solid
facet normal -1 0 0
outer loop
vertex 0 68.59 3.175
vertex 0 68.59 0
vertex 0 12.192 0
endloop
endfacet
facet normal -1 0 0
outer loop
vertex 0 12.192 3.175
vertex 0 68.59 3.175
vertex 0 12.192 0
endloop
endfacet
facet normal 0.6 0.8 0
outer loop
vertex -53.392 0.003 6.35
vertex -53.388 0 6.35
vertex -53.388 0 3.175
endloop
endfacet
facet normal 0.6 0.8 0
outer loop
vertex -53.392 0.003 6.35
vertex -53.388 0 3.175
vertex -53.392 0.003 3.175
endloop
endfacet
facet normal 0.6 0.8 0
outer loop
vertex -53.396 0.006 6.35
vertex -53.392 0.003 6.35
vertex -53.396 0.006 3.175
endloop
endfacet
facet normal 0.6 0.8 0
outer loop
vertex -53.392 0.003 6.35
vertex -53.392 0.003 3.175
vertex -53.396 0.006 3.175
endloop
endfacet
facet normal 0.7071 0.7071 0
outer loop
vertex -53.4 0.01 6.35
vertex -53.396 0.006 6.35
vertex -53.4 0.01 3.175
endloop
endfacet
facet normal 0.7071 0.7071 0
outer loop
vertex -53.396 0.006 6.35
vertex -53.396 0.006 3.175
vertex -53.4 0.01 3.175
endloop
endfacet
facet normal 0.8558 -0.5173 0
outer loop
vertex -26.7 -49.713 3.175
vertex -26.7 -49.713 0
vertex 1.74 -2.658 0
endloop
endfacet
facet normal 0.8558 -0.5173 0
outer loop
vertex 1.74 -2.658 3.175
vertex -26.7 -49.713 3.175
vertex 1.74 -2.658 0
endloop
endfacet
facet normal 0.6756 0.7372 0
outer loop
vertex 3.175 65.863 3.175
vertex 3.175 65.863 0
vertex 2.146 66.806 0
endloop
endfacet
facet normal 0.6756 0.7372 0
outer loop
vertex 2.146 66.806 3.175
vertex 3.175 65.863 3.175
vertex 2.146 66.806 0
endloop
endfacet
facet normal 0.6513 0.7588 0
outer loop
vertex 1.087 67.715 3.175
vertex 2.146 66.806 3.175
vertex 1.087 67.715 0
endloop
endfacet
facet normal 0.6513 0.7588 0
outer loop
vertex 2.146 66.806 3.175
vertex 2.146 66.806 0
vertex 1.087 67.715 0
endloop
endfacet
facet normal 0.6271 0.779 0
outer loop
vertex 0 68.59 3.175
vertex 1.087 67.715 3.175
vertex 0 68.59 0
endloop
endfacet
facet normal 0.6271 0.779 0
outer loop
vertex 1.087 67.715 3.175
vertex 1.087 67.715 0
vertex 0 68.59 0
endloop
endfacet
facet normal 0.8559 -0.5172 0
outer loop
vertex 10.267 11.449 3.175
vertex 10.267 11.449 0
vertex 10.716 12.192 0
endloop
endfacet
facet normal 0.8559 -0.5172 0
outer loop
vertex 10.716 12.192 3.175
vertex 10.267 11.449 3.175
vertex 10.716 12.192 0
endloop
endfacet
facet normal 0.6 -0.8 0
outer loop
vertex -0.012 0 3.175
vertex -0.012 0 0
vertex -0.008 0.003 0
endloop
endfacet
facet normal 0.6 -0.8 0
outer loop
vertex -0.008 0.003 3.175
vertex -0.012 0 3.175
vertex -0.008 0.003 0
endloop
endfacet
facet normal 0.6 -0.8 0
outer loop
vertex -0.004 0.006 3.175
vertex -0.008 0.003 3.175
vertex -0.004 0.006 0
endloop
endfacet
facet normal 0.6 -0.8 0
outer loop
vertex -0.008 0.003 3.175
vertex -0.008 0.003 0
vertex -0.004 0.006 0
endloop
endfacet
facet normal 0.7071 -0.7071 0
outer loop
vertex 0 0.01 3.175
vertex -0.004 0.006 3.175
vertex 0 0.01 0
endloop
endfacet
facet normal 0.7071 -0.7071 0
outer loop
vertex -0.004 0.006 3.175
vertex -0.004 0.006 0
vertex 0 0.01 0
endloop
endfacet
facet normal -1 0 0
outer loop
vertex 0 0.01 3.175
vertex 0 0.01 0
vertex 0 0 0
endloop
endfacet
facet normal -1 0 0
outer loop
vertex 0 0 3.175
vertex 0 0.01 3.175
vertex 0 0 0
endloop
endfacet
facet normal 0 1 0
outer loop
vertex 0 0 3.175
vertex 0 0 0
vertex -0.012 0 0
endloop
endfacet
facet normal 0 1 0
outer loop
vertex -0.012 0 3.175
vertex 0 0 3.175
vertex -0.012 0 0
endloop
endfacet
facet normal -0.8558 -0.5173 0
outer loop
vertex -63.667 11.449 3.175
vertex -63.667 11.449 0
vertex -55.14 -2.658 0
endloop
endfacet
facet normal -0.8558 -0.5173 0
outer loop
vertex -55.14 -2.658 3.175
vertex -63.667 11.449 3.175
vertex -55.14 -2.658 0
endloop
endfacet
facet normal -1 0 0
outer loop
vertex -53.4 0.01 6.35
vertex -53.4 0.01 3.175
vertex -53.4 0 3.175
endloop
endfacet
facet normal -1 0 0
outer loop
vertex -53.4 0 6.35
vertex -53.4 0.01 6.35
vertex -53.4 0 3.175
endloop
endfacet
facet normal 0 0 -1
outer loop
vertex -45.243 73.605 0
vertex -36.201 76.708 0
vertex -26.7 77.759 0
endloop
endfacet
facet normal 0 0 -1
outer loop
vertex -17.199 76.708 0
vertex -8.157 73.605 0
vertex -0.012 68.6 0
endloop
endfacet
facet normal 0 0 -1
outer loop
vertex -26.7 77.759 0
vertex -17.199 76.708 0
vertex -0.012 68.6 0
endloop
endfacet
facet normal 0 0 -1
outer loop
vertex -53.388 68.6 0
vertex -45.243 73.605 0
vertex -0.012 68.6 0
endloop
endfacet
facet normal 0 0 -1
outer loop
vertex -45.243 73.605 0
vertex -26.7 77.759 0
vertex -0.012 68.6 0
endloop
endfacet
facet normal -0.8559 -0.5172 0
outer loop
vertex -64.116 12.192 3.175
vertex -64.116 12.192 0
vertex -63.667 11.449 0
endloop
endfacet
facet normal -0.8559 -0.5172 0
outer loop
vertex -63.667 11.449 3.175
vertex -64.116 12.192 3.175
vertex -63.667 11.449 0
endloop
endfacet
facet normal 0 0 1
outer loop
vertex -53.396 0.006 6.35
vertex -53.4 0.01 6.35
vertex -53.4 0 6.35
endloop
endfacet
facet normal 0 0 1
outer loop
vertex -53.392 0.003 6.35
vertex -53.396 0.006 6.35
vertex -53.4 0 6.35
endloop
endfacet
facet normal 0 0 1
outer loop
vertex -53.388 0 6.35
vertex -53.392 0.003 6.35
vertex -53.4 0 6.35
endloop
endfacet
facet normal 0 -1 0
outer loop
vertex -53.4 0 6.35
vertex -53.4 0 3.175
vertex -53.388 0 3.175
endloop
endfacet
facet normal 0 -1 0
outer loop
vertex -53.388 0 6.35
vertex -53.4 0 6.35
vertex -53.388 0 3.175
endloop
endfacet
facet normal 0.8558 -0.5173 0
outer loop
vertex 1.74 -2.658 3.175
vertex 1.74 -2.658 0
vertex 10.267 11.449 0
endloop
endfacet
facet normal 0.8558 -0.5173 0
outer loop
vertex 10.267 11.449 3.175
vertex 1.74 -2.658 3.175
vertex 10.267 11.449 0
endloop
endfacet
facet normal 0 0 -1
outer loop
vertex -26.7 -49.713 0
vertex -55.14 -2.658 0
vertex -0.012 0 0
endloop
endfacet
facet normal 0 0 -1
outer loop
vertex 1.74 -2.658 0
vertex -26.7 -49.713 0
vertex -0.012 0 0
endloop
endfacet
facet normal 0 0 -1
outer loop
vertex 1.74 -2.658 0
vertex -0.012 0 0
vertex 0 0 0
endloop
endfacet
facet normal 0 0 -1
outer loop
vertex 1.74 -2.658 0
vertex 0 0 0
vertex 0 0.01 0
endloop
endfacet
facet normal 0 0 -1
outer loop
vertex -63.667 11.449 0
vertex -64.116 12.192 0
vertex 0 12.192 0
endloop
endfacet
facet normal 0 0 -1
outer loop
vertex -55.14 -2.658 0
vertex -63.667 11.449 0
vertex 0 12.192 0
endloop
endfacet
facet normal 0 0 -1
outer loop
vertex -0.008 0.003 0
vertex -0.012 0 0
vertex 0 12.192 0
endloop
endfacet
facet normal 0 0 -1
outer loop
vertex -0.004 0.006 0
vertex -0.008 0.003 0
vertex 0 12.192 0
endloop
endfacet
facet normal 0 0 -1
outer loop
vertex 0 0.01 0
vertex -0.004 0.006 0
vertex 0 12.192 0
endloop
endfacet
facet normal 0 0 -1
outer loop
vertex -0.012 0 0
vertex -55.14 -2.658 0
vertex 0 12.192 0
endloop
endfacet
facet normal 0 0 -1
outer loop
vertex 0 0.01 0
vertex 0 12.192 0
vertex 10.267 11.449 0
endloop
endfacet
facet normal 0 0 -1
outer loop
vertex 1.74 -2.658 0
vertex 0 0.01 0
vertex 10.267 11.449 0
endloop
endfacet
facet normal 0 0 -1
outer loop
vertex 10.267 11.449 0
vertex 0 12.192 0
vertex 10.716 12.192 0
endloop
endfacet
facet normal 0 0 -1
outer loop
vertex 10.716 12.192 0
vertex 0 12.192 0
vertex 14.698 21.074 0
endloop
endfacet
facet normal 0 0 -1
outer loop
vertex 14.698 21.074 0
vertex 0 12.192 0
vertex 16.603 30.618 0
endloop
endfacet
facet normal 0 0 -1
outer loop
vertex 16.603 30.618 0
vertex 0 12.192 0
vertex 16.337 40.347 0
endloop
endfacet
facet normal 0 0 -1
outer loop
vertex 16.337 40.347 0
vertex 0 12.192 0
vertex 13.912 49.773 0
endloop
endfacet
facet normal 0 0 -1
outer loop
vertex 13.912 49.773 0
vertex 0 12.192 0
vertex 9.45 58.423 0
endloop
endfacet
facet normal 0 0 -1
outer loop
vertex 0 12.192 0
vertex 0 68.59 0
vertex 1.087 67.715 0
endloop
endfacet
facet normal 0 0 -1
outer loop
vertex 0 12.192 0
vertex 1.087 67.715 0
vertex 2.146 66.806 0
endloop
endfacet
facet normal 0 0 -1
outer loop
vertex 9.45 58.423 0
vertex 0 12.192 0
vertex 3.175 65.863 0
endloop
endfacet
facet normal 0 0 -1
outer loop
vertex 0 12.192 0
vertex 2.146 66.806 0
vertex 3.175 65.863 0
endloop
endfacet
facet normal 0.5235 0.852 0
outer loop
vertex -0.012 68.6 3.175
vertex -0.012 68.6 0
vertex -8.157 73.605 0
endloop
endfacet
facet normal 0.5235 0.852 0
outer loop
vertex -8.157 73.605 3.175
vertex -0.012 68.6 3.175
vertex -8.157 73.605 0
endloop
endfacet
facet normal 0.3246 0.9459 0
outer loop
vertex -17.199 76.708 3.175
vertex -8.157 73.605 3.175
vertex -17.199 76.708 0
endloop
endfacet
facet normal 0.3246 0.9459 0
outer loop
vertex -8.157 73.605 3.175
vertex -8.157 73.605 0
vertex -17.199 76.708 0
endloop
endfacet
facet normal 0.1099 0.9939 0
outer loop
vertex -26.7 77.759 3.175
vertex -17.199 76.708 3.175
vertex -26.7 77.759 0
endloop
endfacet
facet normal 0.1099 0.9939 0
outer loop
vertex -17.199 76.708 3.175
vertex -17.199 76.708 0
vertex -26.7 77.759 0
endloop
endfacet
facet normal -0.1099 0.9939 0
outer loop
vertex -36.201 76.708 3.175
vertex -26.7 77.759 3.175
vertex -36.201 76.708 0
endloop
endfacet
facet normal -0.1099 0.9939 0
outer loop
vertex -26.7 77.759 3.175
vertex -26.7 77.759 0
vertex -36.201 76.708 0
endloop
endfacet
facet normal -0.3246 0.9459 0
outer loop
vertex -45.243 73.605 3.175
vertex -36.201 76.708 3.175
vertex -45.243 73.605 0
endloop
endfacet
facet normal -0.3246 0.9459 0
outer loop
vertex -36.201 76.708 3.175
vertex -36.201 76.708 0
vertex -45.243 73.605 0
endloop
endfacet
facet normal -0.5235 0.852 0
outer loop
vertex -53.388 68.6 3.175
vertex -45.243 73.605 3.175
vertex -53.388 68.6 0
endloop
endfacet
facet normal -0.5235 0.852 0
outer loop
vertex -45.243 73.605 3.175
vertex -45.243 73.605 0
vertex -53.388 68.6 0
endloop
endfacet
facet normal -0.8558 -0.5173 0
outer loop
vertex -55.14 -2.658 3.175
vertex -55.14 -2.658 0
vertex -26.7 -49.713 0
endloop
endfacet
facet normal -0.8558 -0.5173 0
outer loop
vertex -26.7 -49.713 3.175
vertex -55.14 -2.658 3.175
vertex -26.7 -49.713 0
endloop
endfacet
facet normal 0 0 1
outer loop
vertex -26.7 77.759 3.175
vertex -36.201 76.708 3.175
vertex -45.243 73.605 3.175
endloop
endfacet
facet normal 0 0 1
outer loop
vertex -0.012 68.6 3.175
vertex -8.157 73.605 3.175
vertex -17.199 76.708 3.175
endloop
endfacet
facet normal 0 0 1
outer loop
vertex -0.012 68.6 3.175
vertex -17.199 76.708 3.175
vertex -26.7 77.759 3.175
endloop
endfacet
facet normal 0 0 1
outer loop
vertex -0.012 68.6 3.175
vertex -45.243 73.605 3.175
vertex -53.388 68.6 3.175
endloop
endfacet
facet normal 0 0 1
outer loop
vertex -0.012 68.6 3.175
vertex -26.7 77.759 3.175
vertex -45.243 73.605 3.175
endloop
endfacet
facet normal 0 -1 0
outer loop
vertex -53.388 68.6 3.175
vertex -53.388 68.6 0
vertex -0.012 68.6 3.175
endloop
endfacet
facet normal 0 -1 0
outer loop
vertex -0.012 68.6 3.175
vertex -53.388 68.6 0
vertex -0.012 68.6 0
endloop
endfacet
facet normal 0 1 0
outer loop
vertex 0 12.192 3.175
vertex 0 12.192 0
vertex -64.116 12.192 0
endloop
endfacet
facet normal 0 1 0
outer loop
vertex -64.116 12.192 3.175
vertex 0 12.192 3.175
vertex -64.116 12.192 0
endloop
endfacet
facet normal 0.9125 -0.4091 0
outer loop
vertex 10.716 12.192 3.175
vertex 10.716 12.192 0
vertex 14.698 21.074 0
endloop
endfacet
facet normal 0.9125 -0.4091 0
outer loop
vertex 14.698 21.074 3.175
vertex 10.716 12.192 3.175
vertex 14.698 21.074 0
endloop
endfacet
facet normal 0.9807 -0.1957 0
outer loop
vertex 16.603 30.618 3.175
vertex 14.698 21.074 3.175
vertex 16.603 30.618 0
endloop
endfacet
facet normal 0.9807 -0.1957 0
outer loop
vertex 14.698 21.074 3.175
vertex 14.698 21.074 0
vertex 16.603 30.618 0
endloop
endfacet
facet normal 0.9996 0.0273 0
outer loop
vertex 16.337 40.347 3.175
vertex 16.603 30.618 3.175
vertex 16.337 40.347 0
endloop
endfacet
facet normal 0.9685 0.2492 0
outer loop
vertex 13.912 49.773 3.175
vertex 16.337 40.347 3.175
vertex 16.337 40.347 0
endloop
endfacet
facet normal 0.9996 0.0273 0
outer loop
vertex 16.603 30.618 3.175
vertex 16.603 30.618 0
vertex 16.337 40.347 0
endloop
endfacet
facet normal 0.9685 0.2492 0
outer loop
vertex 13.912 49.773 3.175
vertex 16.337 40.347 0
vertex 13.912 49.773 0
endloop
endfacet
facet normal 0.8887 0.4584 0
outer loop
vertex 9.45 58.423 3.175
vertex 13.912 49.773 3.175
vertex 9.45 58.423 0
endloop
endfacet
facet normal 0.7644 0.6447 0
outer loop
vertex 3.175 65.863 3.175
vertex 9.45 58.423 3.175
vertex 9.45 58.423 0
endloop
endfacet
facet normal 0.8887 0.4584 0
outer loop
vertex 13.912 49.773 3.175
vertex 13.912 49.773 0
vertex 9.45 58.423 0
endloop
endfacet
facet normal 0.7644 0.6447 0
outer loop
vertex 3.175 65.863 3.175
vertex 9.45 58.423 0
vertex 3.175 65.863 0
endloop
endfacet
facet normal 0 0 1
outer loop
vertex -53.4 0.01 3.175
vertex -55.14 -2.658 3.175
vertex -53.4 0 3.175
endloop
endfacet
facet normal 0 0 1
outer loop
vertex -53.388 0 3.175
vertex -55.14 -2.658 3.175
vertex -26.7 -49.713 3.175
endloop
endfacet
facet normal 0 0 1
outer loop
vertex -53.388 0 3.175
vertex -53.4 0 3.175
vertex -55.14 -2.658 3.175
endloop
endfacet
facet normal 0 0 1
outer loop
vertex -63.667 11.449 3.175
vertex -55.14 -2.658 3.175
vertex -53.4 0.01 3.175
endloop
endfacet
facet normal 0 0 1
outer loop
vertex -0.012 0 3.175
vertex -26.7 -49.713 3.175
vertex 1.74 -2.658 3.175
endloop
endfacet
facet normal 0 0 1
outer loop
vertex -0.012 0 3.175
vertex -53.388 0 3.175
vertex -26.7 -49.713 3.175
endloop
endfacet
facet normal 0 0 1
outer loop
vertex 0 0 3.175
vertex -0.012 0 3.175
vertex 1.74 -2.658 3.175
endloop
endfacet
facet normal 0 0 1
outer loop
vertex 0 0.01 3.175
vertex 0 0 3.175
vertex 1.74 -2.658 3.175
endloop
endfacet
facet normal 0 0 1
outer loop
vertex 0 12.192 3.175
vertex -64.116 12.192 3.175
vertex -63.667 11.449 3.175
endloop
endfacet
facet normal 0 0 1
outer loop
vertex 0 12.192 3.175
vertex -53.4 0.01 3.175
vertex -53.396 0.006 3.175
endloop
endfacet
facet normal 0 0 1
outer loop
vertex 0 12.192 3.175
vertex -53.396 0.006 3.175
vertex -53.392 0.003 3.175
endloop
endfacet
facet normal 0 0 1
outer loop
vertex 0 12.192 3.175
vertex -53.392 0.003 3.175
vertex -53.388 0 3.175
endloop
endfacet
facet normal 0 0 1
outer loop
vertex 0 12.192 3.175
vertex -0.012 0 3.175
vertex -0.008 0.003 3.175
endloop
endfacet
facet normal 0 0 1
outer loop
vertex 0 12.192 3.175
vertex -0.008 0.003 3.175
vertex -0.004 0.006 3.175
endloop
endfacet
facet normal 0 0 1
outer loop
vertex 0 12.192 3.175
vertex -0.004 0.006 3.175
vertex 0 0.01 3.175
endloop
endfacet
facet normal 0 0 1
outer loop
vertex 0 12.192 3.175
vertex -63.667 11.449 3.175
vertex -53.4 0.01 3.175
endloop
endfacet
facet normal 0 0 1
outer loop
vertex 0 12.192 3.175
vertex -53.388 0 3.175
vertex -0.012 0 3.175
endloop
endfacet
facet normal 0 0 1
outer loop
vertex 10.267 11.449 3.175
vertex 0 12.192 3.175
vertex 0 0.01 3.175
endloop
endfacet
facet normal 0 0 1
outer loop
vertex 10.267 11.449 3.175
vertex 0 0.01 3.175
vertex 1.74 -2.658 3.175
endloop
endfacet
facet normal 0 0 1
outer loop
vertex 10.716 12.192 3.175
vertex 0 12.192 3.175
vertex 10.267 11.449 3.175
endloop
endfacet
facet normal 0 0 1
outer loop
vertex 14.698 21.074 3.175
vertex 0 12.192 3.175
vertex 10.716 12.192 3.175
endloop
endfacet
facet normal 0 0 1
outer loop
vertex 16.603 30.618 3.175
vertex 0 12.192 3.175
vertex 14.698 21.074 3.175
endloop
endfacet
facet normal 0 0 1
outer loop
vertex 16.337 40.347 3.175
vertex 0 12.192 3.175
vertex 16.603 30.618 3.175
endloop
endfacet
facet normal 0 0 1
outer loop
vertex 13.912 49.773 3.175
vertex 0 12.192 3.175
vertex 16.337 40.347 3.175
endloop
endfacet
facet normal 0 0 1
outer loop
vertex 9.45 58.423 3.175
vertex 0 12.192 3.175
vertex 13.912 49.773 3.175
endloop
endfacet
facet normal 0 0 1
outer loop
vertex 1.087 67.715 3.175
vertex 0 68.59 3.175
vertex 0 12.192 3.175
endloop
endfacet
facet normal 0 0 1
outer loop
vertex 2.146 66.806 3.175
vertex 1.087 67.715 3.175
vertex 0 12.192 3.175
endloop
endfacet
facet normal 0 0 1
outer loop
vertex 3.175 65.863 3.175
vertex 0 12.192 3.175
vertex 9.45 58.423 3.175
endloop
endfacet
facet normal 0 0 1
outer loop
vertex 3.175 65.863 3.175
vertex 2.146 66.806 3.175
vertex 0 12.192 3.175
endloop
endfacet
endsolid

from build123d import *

# Parameters (mm, degrees)
F1_DEPTH = 3.175
F2_DEPTH = 6.35


# Not quite as in the source:
# - a feature names something its author has since deleted; it is built from what else it names


with BuildPart() as f1:
    # F0 (on Top) → F1 (new body)
    with BuildSketch(Plane.XY):
        with BuildLine():
            ThreePointArc((-0.0123727477, 68.6), (-26.7, 77.7594), (-53.3876272523, 68.6))
            Line((-53.3876272523, 68.6), (-0.0123727477, 68.6))
        make_face()
    extrude(amount=F1_DEPTH)


with BuildPart() as f1b:
    # F0 (on Top) → F1, piece 2 (new body)
    with BuildSketch(Plane.XY):
        Polygon((0, 12.1924446831), (-53.4, 12.1924446831), (-64.1162457533, 12.1924446831), (-63.6671424385, 11.4494020146), (-55.1402698288, -2.6583321515), (-26.7, -49.7128367424), (1.7402698288, -2.6583321515), (10.2671424385, 11.4494020146), (10.7162457533, 12.1924446831), (3.175, 12.1924446831), align=None)
        with BuildLine():
            Line((-53.4, 0), (-53.4, 0.0096303846))
            ThreePointArc((-53.4, 0.0096303846), (-53.3938140605, 0.0048146343), (-53.3876272523, 0))
            Line((-53.3876272523, 0), (-53.4, 0))
        make_face(mode=Mode.SUBTRACT)
        with BuildLine():
            ThreePointArc((-0.0123727477, 0), (-0.0061859395, 0.0048146343), (0, 0.0096303846))
            Line((0, 0.0096303846), (0, 0))
            Line((0, 0), (-0.0123727477, 0))
        make_face(mode=Mode.SUBTRACT)
        with BuildLine():
            ThreePointArc((3.175, 65.8626967061), (1.6203585098, 67.2647803305), (0, 68.5903696154))
            Line((0, 68.5903696154), (0, 12.1924446831))
            Line((0, 12.1924446831), (3.175, 12.1924446831))
            Line((3.175, 12.1924446831), (3.175, 65.8626967061))
        make_face()
        with BuildLine():
            ThreePointArc((10.7162457533, 12.1924446831), (16.3366347059, 40.3471085281), (3.175, 65.8626967061))
            Line((3.175, 65.8626967061), (3.175, 12.1924446831))
            Line((3.175, 12.1924446831), (10.7162457533, 12.1924446831))
        make_face()
    extrude(amount=F1_DEPTH)

    # F0 (on Top) → F2 (join)
    with BuildSketch(Plane.XY):
        with BuildLine():
            ThreePointArc((-53.3876272523, 0), (-53.3938140605, 0.0048146343), (-53.4, 0.0096303846))
            Line((-53.4, 0.0096303846), (-53.4, 0))
            Line((-53.4, 0), (-53.3876272523, 0))
        make_face()
    extrude(amount=F2_DEPTH)


solid = Compound([f1.part, f1b.part])
